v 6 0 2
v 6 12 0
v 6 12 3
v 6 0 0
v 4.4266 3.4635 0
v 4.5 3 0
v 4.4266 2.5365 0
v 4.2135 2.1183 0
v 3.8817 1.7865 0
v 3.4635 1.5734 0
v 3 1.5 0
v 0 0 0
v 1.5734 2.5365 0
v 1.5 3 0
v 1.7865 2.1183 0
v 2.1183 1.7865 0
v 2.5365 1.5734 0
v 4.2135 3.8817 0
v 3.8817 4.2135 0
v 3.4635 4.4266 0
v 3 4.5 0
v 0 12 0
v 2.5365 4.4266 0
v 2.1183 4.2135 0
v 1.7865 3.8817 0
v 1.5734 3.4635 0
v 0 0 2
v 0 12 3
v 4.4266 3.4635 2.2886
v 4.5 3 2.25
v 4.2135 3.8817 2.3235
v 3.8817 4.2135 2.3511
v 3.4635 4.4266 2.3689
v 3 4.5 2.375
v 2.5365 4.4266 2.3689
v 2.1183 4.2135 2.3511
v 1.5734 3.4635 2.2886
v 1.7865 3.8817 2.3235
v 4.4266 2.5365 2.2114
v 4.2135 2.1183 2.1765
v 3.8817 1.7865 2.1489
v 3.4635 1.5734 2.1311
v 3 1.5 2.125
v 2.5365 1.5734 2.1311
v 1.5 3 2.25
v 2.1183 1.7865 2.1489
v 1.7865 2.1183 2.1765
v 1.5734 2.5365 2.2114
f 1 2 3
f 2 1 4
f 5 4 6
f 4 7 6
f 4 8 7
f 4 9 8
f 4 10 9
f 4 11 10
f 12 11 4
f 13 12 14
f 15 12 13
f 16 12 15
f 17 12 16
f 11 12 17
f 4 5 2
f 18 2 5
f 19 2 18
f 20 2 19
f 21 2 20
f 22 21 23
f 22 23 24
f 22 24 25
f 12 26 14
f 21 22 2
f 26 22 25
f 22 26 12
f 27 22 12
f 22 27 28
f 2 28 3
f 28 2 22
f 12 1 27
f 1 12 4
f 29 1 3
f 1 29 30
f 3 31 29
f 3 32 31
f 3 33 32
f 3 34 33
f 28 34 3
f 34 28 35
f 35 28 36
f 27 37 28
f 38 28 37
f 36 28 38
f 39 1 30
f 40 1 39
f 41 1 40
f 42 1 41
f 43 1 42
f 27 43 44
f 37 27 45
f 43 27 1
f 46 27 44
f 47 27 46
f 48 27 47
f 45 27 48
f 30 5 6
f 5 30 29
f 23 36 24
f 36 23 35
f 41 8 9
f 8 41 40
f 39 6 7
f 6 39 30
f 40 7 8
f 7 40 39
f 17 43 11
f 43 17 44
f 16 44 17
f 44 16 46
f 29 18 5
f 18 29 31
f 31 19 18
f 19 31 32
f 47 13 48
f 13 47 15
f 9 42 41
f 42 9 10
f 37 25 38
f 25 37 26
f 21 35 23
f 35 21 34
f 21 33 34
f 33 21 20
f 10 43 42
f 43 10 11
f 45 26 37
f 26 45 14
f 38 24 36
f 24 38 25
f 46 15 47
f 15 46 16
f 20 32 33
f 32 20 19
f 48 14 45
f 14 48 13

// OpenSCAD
screw_d = 3;
width = 6;
depth = 12;
hight_beginning = 2;
hight_ennding = 3;

difference(){
    block();
    #translate([3, 3,-5]) cylinder(10, d=screw_d,[0,0,0], $fn = 20);
}

 module prism(l, w, h){
       polyhedron(
               points=[[0,0,0], [l,0,0], [l,w,0], [0,w,0], [0,w,h], [l,w,h]],
                center=true,
               faces=[[0,1,2,3],[5,4,3,2],[0,4,5,1],[0,3,4],[5,2,1]]

                 );
     }
 
module block(){
        cube([width,depth,hight_beginning],[0,0,0]);
        translate([0,0,hight_beginning]) prism(width, depth, (hight_ennding-hight_beginning));
    
}
